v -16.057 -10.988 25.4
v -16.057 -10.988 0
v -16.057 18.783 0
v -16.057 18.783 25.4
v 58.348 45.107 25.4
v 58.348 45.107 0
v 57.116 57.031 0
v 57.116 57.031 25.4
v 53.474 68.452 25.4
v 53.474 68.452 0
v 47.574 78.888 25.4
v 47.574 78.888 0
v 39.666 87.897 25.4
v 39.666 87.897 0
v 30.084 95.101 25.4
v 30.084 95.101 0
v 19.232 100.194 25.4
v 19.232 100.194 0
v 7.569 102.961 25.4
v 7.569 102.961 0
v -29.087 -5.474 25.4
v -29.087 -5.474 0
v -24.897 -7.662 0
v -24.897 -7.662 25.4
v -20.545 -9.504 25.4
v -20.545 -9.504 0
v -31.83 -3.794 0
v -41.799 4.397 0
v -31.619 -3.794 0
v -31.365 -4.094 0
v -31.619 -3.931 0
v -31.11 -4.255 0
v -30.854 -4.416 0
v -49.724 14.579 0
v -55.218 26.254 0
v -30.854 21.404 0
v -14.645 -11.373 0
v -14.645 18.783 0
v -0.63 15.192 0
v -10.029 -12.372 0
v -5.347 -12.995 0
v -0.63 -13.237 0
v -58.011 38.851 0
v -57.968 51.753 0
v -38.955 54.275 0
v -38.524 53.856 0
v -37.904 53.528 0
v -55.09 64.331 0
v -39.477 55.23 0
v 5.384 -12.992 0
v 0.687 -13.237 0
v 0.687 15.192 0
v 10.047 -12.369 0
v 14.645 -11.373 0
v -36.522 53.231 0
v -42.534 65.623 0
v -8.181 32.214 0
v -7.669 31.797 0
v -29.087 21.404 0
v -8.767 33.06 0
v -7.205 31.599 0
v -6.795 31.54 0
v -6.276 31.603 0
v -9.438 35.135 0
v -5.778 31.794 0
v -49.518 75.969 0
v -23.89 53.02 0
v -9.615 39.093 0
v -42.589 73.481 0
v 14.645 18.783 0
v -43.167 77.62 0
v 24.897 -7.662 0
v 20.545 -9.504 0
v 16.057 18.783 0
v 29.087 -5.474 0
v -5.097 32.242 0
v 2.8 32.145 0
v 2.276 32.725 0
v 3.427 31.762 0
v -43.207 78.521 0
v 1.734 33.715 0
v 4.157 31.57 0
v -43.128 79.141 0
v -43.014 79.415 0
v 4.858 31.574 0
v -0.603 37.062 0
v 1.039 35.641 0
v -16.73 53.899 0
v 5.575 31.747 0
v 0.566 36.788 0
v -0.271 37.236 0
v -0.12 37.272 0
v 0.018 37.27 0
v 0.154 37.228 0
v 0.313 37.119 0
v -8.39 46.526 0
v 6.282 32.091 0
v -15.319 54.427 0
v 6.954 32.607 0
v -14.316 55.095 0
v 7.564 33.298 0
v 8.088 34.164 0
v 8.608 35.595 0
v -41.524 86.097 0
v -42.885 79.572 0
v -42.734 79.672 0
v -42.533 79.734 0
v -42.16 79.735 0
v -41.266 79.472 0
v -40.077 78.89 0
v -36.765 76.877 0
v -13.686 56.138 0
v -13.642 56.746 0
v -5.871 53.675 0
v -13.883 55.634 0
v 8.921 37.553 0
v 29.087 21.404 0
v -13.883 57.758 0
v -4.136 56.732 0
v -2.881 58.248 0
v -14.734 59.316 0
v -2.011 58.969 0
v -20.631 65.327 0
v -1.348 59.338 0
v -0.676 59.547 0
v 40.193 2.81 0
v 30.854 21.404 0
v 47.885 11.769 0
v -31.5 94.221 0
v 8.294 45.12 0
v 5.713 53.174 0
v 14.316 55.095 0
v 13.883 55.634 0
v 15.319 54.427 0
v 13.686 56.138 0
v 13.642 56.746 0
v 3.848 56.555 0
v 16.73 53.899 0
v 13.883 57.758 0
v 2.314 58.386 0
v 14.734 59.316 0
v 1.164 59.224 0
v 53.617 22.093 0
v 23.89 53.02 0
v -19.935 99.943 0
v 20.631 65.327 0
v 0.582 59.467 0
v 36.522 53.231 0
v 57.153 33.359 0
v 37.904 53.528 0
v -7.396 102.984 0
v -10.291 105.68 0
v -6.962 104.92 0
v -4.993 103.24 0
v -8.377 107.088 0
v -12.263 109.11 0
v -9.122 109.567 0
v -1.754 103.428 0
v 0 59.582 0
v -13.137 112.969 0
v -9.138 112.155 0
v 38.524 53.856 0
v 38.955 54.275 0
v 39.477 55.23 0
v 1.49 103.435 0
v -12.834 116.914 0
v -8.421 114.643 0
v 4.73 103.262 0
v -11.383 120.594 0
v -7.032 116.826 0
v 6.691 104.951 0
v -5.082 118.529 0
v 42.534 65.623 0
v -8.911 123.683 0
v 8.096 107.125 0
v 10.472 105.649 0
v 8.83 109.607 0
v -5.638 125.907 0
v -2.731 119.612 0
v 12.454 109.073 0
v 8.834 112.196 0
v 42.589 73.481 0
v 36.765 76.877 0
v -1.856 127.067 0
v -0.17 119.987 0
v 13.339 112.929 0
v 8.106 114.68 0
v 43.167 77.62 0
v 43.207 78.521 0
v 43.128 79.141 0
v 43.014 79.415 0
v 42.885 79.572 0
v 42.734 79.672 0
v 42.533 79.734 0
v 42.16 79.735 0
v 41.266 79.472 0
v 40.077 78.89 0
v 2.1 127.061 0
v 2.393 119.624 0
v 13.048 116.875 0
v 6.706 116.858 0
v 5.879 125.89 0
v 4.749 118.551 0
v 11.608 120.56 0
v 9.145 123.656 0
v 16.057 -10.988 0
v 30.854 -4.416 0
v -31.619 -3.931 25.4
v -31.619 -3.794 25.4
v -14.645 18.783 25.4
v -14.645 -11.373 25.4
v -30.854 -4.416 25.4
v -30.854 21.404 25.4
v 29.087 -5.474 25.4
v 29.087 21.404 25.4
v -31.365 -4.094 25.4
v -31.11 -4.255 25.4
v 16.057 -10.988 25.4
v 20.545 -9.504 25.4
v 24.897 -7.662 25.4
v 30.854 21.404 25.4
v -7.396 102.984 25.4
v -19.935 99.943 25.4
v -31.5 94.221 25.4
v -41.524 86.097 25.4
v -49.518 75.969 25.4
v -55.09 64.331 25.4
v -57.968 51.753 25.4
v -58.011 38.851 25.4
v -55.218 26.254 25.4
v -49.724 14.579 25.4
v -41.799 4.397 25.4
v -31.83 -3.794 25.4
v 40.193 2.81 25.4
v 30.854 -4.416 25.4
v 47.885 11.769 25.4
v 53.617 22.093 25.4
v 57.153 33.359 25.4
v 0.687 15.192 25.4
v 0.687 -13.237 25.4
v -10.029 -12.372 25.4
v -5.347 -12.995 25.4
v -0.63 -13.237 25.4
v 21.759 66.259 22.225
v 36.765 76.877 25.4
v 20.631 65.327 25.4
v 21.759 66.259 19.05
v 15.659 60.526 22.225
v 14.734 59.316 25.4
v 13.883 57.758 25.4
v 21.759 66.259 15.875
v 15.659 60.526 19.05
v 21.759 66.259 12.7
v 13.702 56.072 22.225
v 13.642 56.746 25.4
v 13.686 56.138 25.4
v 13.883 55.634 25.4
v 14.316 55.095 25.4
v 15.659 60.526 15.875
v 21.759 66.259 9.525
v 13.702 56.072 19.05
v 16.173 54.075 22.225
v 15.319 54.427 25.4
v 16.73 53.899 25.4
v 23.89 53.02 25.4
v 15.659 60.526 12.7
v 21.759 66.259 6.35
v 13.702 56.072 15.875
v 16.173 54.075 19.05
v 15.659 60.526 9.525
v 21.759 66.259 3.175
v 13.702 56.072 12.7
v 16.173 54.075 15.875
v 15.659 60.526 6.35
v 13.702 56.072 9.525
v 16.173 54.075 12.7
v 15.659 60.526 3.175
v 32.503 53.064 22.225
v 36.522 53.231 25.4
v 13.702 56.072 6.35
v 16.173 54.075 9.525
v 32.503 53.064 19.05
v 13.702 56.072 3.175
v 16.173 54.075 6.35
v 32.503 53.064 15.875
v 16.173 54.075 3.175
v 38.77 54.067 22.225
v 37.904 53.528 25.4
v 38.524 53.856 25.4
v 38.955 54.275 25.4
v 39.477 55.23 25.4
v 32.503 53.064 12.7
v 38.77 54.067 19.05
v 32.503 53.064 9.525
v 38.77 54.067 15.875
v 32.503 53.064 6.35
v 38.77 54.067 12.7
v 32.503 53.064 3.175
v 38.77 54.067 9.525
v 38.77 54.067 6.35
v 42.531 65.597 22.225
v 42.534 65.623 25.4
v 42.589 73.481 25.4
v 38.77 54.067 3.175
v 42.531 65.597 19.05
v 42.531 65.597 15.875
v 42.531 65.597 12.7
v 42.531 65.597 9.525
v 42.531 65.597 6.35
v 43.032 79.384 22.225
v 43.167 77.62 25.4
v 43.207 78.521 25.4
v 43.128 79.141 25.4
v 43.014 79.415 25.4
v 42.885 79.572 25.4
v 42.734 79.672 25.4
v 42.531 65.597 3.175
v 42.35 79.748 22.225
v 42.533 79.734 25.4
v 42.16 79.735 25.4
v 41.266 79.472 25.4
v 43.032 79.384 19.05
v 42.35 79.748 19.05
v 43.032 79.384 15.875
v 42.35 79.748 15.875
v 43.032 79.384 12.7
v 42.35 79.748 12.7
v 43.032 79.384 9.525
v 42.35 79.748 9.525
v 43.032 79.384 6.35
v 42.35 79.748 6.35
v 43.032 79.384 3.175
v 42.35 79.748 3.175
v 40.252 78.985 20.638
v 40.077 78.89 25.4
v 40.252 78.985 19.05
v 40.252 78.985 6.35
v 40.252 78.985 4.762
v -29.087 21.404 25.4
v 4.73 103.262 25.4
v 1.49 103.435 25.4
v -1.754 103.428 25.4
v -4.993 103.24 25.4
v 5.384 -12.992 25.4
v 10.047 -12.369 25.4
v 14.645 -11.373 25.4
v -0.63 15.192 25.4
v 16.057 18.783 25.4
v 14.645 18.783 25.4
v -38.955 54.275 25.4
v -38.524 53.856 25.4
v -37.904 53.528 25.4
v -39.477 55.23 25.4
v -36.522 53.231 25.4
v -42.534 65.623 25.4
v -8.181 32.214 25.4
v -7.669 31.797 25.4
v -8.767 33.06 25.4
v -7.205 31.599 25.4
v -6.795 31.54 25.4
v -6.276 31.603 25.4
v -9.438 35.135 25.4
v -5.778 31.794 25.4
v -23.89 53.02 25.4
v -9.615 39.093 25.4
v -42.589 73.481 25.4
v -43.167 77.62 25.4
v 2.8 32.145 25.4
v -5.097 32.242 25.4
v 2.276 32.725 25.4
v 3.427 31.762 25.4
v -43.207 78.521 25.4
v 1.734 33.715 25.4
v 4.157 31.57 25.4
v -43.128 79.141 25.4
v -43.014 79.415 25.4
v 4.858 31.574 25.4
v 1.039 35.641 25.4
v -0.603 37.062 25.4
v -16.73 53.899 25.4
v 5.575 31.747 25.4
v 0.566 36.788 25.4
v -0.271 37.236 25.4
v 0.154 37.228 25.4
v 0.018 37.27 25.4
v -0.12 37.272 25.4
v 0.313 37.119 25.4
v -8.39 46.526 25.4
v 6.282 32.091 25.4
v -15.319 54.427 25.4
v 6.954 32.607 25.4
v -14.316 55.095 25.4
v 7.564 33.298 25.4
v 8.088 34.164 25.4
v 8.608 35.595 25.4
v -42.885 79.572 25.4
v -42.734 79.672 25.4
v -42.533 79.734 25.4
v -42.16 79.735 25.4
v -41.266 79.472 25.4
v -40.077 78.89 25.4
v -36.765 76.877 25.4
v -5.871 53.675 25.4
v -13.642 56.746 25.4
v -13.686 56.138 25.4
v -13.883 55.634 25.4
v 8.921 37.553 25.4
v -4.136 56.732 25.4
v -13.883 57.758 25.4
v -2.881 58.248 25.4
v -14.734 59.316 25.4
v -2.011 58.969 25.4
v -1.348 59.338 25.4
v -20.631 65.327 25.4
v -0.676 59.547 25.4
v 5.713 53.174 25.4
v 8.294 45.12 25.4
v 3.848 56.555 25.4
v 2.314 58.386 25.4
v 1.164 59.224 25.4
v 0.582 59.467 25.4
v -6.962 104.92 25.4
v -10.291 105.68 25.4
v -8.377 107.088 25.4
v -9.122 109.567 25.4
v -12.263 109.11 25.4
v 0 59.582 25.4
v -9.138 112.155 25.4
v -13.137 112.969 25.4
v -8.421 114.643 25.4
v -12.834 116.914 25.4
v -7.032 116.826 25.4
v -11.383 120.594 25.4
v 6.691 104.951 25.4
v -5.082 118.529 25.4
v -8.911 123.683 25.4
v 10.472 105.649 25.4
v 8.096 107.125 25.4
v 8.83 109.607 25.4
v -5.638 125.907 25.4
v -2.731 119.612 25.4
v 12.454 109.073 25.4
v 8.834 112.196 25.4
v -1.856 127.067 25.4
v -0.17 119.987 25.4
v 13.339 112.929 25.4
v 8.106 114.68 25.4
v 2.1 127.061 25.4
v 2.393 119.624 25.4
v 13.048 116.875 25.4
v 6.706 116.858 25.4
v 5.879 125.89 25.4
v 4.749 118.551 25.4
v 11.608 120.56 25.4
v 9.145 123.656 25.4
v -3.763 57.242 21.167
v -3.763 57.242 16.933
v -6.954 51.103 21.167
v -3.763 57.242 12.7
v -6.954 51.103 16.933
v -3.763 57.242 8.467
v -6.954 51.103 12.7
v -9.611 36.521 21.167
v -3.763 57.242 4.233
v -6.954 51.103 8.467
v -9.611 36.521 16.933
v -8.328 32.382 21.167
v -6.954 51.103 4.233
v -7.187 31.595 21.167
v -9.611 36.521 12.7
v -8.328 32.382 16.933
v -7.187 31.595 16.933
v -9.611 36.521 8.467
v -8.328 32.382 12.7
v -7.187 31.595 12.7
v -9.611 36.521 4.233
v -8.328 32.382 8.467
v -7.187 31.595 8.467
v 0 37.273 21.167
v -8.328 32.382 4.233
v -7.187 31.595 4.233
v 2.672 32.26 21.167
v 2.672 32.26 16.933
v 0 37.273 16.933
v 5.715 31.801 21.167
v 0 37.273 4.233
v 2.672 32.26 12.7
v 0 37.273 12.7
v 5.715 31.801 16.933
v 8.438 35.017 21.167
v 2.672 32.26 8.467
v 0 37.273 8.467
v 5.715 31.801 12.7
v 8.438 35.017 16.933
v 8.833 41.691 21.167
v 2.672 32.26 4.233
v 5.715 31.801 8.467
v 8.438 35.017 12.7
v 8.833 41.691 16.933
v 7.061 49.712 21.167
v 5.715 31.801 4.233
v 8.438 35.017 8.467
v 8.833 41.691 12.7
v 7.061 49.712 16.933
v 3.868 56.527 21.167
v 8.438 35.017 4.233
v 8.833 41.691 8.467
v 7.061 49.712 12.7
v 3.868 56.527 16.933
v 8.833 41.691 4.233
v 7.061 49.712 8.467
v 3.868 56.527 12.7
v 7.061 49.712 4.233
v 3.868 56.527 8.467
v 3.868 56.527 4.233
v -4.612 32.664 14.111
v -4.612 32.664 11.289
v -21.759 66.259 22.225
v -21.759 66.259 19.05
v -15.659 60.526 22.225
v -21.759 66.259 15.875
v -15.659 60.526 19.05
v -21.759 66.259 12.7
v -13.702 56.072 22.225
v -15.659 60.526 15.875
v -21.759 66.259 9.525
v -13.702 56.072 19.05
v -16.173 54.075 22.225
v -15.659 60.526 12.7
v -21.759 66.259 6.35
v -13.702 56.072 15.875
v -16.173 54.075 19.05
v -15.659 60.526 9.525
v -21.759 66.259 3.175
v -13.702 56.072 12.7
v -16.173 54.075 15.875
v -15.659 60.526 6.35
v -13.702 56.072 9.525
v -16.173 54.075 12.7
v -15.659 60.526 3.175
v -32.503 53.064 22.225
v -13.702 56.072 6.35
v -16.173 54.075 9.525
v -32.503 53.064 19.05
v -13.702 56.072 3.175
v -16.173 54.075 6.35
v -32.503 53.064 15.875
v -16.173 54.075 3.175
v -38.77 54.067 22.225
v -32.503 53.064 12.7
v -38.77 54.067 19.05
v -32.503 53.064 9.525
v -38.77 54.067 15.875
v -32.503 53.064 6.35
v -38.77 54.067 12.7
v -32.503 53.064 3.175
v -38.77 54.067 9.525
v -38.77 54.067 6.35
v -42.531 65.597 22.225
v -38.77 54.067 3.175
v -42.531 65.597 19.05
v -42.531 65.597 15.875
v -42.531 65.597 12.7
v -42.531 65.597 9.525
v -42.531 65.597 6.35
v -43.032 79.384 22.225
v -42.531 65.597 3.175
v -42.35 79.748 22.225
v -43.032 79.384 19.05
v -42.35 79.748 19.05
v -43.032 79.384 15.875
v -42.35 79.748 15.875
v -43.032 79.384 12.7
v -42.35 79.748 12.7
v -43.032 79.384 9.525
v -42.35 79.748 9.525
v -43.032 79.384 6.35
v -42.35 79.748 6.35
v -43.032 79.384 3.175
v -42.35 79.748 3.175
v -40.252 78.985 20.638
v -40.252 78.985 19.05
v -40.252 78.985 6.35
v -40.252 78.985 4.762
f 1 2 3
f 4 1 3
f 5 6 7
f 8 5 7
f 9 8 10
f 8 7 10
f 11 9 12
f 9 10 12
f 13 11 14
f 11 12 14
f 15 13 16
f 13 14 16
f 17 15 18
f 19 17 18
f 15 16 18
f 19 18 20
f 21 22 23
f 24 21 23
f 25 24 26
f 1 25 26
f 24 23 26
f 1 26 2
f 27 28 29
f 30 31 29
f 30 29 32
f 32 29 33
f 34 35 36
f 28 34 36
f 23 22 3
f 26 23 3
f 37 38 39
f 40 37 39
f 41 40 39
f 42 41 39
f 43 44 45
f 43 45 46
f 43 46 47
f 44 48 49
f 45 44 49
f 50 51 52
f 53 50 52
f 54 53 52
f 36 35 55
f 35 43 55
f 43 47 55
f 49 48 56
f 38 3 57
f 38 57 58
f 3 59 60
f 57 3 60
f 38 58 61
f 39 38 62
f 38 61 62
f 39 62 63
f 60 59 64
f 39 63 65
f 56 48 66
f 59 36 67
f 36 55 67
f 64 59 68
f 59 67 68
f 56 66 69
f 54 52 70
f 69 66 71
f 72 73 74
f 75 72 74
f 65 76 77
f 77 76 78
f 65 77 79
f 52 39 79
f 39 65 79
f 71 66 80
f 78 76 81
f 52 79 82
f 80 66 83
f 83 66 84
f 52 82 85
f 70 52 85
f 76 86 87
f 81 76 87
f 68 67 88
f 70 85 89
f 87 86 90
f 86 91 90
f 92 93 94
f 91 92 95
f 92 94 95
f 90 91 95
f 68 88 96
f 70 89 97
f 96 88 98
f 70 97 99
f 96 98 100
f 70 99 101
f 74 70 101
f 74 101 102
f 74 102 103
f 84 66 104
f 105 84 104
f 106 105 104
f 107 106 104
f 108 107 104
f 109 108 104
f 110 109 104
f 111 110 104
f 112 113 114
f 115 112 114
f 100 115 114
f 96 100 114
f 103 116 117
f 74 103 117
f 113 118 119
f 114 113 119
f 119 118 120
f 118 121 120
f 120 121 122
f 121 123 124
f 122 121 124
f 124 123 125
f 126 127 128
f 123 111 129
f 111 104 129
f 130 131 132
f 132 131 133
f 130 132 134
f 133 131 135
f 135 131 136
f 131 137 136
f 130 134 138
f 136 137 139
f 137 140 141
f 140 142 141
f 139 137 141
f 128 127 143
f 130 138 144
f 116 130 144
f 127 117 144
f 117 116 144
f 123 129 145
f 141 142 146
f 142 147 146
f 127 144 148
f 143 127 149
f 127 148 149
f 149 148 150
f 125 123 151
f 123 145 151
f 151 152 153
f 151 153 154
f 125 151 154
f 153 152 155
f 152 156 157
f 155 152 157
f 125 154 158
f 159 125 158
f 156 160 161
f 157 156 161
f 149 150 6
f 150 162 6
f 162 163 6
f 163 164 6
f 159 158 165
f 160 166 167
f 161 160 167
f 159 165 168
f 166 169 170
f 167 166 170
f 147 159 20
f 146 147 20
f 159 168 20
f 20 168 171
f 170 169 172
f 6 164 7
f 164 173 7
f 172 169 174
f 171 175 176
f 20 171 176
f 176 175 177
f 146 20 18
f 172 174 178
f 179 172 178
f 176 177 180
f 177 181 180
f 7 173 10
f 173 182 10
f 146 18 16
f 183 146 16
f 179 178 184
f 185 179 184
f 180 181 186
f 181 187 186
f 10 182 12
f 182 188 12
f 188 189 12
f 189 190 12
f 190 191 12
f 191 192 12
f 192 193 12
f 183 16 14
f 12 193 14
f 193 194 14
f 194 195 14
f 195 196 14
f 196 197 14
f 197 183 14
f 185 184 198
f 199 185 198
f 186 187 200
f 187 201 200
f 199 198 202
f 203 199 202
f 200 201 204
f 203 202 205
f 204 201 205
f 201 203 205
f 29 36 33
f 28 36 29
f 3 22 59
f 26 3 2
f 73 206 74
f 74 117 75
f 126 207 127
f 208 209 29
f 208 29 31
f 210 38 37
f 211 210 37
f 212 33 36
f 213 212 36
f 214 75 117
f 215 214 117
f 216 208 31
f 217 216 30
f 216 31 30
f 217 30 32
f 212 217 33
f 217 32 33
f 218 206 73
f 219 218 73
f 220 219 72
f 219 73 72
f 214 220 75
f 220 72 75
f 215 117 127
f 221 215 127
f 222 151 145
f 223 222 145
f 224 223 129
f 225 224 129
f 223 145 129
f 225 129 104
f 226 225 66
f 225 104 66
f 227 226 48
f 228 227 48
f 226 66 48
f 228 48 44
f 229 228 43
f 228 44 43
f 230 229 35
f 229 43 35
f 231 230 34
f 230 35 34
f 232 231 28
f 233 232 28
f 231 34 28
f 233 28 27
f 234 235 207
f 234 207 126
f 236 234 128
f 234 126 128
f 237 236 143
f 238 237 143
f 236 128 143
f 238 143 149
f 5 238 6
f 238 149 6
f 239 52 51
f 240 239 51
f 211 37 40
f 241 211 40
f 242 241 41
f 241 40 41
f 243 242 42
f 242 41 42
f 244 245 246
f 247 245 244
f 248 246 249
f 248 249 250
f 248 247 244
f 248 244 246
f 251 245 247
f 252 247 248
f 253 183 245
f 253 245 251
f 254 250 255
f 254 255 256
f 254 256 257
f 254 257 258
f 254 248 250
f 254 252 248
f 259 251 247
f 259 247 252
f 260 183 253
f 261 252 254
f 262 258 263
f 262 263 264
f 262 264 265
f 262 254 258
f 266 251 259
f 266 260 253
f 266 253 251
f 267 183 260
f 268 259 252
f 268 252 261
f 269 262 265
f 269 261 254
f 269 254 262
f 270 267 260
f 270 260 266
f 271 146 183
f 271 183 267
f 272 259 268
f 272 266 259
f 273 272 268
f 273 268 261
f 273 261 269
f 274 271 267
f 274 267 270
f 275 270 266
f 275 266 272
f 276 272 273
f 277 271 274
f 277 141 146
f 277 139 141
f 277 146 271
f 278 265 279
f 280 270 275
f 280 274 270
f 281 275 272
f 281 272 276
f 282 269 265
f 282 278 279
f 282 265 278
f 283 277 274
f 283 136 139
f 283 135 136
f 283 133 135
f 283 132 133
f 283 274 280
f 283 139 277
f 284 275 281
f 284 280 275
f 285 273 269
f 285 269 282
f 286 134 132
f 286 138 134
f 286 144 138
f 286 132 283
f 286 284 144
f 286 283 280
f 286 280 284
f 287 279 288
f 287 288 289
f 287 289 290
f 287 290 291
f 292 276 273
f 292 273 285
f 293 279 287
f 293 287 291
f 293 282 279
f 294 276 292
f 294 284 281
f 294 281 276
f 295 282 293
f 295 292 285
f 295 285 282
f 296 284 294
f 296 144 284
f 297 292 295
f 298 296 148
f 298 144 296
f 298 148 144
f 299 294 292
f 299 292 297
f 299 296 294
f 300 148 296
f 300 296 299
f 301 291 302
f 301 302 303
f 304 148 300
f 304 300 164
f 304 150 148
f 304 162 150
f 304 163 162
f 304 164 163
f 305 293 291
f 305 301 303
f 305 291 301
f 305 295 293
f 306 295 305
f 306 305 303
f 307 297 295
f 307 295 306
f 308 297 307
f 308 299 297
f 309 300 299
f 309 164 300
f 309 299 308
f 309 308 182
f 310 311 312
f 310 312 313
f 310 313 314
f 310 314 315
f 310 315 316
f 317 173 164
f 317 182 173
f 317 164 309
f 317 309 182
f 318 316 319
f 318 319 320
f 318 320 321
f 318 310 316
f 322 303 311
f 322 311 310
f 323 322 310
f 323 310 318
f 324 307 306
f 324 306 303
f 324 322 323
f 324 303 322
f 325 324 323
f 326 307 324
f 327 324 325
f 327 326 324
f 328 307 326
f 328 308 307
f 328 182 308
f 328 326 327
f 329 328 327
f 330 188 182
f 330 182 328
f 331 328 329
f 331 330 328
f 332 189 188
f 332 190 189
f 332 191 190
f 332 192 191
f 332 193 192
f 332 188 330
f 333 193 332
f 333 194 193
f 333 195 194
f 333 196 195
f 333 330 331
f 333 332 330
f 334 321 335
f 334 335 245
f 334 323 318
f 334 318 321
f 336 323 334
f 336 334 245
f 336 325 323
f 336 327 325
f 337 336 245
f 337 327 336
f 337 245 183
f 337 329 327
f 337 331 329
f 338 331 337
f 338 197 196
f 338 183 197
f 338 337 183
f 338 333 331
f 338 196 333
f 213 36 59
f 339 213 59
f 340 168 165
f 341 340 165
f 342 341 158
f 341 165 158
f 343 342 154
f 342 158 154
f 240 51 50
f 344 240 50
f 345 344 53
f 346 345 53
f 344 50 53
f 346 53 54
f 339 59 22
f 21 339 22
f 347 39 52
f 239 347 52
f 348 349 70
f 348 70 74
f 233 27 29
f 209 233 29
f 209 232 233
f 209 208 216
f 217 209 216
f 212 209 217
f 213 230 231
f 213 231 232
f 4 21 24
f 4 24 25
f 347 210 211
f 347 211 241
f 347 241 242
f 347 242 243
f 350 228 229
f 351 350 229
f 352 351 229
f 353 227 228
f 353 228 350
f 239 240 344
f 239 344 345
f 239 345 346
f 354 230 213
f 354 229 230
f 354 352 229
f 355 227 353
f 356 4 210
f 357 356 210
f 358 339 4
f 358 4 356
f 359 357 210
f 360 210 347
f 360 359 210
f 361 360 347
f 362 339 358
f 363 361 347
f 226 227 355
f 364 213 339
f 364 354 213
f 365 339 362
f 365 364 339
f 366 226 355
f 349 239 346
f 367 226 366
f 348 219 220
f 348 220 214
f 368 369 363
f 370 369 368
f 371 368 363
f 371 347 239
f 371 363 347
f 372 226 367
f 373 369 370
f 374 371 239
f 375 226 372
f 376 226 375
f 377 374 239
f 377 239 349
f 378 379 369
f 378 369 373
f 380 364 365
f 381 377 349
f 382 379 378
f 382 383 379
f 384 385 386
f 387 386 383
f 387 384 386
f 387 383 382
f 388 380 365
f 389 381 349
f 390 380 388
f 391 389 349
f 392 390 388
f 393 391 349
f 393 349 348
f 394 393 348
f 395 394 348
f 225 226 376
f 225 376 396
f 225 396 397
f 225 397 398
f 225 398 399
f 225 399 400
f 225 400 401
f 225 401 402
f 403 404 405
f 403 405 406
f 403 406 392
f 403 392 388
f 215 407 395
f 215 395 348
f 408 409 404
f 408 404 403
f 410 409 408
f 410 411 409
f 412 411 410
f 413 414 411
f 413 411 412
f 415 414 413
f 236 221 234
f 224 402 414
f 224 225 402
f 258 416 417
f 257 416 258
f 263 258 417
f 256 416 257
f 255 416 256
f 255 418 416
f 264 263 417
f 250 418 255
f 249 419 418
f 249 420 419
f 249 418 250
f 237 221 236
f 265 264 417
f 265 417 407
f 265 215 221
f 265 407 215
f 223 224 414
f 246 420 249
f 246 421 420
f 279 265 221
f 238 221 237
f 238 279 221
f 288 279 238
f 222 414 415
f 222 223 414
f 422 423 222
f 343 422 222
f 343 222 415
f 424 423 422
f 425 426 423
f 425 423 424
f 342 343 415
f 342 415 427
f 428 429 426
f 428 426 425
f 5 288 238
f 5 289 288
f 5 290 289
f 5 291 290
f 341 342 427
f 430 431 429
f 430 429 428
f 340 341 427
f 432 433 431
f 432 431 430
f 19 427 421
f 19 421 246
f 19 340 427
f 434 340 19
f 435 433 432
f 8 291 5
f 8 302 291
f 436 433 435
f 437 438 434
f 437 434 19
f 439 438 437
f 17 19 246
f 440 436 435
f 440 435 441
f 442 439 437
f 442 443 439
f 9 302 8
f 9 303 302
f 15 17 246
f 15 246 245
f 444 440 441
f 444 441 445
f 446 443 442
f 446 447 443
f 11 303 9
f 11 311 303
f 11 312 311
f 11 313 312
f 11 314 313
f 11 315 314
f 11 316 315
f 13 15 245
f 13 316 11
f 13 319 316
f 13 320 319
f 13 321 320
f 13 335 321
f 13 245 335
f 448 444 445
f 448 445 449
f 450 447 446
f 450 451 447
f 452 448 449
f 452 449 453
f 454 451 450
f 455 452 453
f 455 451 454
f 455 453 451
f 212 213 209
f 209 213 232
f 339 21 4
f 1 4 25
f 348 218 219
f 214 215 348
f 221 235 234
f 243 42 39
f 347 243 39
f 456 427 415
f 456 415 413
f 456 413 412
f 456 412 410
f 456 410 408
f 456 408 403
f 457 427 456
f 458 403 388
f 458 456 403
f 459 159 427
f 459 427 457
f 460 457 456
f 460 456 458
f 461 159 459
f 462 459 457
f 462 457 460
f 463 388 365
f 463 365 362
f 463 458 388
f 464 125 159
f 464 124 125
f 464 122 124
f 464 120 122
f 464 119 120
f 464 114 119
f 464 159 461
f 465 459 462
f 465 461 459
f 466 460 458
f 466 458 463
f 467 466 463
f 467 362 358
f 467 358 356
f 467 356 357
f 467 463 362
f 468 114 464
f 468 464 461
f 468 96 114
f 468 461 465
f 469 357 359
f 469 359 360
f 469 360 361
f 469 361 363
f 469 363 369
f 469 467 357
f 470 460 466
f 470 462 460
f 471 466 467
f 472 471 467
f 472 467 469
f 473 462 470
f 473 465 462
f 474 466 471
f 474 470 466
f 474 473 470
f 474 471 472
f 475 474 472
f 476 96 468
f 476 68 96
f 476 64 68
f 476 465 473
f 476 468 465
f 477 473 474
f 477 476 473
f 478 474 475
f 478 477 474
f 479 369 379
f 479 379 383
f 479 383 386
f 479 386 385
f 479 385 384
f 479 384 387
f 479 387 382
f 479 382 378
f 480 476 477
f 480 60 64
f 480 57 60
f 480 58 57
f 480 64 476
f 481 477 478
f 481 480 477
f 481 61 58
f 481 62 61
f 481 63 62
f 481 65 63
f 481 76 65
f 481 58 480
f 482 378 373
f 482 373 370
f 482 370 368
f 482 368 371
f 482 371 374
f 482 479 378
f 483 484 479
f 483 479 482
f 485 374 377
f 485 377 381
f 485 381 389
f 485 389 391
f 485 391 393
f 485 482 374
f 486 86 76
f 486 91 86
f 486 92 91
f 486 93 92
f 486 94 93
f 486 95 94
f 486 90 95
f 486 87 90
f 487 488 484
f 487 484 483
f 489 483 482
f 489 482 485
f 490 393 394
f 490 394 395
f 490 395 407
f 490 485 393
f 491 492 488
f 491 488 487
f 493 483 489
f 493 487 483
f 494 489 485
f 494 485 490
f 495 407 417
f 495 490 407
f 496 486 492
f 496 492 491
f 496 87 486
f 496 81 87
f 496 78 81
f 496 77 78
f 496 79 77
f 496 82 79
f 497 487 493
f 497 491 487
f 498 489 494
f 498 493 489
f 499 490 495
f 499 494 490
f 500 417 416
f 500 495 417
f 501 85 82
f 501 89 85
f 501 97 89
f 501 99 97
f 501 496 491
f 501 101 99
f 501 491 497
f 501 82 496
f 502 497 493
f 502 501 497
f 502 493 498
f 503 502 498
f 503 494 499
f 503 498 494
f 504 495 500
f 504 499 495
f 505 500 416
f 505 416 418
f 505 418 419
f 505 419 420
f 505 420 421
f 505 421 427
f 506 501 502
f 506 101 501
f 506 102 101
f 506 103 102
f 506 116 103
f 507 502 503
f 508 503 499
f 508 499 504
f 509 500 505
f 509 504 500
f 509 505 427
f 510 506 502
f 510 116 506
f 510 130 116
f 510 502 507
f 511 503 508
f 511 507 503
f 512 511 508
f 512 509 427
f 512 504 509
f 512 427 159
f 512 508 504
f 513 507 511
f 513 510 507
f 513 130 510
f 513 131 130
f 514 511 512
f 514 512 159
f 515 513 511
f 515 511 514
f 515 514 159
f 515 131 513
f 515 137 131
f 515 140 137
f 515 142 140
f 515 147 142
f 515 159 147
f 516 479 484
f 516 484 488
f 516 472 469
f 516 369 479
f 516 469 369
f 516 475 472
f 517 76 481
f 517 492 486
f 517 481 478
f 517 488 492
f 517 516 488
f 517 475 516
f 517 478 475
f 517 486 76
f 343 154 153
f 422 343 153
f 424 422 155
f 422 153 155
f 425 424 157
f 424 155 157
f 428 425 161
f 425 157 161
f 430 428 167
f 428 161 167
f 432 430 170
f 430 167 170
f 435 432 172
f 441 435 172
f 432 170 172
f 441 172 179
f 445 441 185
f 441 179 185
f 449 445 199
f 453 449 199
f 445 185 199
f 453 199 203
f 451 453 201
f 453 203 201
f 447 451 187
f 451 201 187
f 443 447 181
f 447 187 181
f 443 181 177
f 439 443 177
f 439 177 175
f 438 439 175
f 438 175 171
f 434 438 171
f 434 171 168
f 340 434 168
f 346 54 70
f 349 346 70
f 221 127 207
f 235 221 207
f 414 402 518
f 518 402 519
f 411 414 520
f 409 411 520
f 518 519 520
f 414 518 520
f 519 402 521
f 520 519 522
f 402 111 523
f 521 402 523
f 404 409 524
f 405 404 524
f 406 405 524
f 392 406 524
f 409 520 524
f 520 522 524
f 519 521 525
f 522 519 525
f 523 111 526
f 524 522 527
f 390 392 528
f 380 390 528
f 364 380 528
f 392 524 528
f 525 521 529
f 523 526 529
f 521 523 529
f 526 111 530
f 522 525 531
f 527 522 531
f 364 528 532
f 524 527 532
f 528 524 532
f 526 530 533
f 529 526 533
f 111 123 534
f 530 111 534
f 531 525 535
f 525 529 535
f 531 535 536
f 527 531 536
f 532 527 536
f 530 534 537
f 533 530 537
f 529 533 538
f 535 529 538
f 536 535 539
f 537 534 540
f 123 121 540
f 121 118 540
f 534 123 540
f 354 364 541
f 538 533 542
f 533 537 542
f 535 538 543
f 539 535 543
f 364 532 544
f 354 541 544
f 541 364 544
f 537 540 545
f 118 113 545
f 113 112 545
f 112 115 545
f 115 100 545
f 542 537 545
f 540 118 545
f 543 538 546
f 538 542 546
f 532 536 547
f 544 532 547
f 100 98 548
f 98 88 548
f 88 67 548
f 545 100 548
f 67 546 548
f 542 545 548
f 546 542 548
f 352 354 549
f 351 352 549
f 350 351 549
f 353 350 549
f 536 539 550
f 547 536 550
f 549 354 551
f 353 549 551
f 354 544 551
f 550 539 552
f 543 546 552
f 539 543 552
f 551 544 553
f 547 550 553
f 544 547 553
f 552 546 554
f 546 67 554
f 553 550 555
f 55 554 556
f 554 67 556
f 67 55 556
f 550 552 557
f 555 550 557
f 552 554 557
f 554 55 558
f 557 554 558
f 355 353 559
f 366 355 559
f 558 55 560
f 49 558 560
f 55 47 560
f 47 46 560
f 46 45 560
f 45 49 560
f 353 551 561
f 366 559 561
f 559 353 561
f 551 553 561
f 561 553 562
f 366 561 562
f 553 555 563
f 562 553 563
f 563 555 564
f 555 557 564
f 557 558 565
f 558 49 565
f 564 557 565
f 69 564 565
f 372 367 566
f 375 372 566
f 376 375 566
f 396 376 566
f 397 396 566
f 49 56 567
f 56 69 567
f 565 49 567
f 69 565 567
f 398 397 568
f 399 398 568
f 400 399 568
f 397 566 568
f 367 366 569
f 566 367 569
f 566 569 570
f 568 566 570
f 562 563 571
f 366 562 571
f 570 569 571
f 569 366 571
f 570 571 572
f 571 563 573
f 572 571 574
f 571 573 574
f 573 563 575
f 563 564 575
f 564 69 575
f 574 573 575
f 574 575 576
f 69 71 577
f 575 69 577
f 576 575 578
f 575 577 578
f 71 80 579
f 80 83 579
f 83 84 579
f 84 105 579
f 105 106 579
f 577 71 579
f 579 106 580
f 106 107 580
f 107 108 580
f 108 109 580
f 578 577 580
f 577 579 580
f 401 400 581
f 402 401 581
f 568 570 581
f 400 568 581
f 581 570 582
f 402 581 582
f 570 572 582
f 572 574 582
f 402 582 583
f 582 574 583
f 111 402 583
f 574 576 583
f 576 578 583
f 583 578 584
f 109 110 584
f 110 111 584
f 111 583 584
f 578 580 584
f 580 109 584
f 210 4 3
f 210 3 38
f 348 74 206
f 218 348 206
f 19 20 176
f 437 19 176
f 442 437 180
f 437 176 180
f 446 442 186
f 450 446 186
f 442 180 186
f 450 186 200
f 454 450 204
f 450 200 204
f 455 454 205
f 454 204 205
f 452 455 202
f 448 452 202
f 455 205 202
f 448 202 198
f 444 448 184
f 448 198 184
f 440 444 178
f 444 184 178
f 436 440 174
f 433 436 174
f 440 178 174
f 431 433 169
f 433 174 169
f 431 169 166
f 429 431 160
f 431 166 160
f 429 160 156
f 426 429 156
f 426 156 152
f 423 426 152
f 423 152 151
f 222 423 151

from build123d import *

# Parameters (mm, degrees)
F1_DEPTH = 25.4


with BuildPart() as f1:
    # F0 (on Top) → F1 (new body)
    with BuildSketch(Plane.XY):
        with BuildLine():
            ThreePointArc((30.8535993099, -4.4157840249), (51.0130957631, 16.7854556593), (58.347572767, 45.1068840921))
            ThreePointArc((58.347572767, 45.1068840921), (43.852326854, 83.5960082351), (7.5686763352, 102.9614810256))
            ThreePointArc((7.5686763352, 102.9614810256), (6.1509528321, 103.129336876), (4.7295469743, 103.2624567677))
            ThreePointArc((4.7295469743, 103.2624567677), (-0.1321923759, 103.4543071113), (-4.9930125051, 103.2404292612))
            ThreePointArc((-4.9930125051, 103.2404292612), (-6.1958302948, 103.1245618702), (-7.3959906348, 102.9838101536))
            ThreePointArc((-7.3959906348, 102.9838101536), (-56.8774451223, 58.1220861332), (-31.8298459323, -3.794037737))
            Line((-31.8298459323, -3.794037737), (-31.6190180173, -3.794037737))
            Line((-31.6190180173, -3.794037737), (-31.6190180173, -3.9306214259))
            ThreePointArc((-31.6190180173, -3.9306214259), (-31.2372505931, -4.1746887642), (-30.8535993099, -4.4157840249))
            Line((-30.8535993099, -4.4157840249), (-30.8535993099, 21.4036349207))
            Line((-30.8535993099, 21.4036349207), (-29.086828904, 21.4036349207))
            Line((-29.086828904, 21.4036349207), (-29.086828904, -5.4737014335))
            ThreePointArc((-29.086828904, -5.4737014335), (-22.7396370491, -8.6271661431), (-16.0569306463, -10.9878057281))
            Line((-16.0569306463, -10.9878057281), (-16.0569306463, 18.7828950584))
            Line((-16.0569306463, 18.7828950584), (-14.6449233324, 18.7828950584))
            Line((-14.6449233324, 18.7828950584), (-14.6449233324, -11.3728951957))
            ThreePointArc((-14.6449233324, -11.3728951957), (-7.6939242613, -12.7311896765), (-0.6295621325, -13.2372921325))
            Line((-0.6295621325, -13.2372921325), (-0.6295621325, 15.1916090399))
            Line((-0.6295621325, 15.1916090399), (0.6865363102, 15.1916090399))
            Line((0.6865363102, 15.1916090399), (0.6865363102, -13.2366495316))
            ThreePointArc((0.6865363102, -13.2366495316), (7.722163476, -12.7274261316), (14.6449233324, -11.3728951957))
            Line((14.6449233324, -11.3728951957), (14.6449233324, 18.7828950584))
            Line((14.6449233324, 18.7828950584), (16.0569306463, 18.7828950584))
            Line((16.0569306463, 18.7828950584), (16.0569306463, -10.9878057281))
            ThreePointArc((16.0569306463, -10.9878057281), (22.7396370491, -8.6271661431), (29.086828904, -5.4737014335))
            Line((29.086828904, -5.4737014335), (29.086828904, 21.4036349207))
            Line((29.086828904, 21.4036349207), (30.8535993099, 21.4036349207))
            Line((30.8535993099, 21.4036349207), (30.8535993099, -4.4157840249))
        make_face()
        with BuildLine():
            add(Edge.make_bspline(
                [(0, 59.581592679), (-5.1744224366, 60.0052676457), (-12.6268059879, 36.4629573704), (-5.8511859394, 28.7499016601), (0.846767048, 41.3067506684), (1.3609583881, 29.9680401259), (13.4525305094, 33.3165466695), (5.2759383626, 59.1496057206), (0, 59.581592679)],
                knots=[0, 0, 0, 0, 0.2461617493, 0.3674777738, 0.5071240723, 0.6245056694, 0.7490088542, 1, 1, 1, 1], degree=3))
        make_face(mode=Mode.SUBTRACT)
        with BuildLine():
            add(Edge.make_bspline(
                [(-36.7649719119, 76.8771916628), (-28.7192071866, 71.7363100119), (0.2323351041, 51.9487887099), (-33.0474097049, 53.1752546508), (-39.2200220876, 53.1107869017), (-40.1181378051, 58.1129896149), (-43.372489282, 65.7563729144), (-41.8392659481, 72.2367042488), (-44.425070872, 81.4599884568), (-40.5156485459, 79.2737052752), (-36.7649719119, 76.8771916628)],
                knots=[0, 0, 0, 0, 0.2214766404, 0.3948821826, 0.4949979166, 0.5749687847, 0.6880101274, 0.7951541475, 0.8967547165, 1, 1, 1, 1], degree=3))
        make_face(mode=Mode.SUBTRACT)
        with BuildLine():
            add(Edge.make_bspline(
                [(36.7649719119, 76.8771916628), (28.7192071866, 71.7363100119), (-0.2323351041, 51.9487887099), (33.0474097049, 53.1752546508), (39.2200220876, 53.1107869017), (40.1181378051, 58.1129896149), (43.372489282, 65.7563729144), (41.8392659481, 72.2367042488), (44.425070872, 81.4599884568), (40.5156485459, 79.2737052752), (36.7649719119, 76.8771916628)],
                knots=[0, 0, 0, 0, 0.2214766404, 0.3948821826, 0.4949979166, 0.5749687847, 0.6880101274, 0.7951541475, 0.8967547165, 1, 1, 1, 1], degree=3))
        make_face(mode=Mode.SUBTRACT)
        with BuildLine():
            ThreePointArc((4.7295469743, 103.2624567677), (6.1509528321, 103.129336876), (7.5686763352, 102.9614810256))
            ThreePointArc((7.5686763352, 102.9614810256), (0.1225116505, 127.2124658536), (-7.3959906348, 102.9838101536))
            ThreePointArc((-7.3959906348, 102.9838101536), (-6.1958302948, 103.1245618702), (-4.9930125051, 103.2404292612))
            ThreePointArc((-4.9930125051, 103.2404292612), (-0.1696488917, 119.9869638405), (4.7295469743, 103.2624567677))
        make_face()
    extrude(amount=F1_DEPTH)


solid = f1.part
